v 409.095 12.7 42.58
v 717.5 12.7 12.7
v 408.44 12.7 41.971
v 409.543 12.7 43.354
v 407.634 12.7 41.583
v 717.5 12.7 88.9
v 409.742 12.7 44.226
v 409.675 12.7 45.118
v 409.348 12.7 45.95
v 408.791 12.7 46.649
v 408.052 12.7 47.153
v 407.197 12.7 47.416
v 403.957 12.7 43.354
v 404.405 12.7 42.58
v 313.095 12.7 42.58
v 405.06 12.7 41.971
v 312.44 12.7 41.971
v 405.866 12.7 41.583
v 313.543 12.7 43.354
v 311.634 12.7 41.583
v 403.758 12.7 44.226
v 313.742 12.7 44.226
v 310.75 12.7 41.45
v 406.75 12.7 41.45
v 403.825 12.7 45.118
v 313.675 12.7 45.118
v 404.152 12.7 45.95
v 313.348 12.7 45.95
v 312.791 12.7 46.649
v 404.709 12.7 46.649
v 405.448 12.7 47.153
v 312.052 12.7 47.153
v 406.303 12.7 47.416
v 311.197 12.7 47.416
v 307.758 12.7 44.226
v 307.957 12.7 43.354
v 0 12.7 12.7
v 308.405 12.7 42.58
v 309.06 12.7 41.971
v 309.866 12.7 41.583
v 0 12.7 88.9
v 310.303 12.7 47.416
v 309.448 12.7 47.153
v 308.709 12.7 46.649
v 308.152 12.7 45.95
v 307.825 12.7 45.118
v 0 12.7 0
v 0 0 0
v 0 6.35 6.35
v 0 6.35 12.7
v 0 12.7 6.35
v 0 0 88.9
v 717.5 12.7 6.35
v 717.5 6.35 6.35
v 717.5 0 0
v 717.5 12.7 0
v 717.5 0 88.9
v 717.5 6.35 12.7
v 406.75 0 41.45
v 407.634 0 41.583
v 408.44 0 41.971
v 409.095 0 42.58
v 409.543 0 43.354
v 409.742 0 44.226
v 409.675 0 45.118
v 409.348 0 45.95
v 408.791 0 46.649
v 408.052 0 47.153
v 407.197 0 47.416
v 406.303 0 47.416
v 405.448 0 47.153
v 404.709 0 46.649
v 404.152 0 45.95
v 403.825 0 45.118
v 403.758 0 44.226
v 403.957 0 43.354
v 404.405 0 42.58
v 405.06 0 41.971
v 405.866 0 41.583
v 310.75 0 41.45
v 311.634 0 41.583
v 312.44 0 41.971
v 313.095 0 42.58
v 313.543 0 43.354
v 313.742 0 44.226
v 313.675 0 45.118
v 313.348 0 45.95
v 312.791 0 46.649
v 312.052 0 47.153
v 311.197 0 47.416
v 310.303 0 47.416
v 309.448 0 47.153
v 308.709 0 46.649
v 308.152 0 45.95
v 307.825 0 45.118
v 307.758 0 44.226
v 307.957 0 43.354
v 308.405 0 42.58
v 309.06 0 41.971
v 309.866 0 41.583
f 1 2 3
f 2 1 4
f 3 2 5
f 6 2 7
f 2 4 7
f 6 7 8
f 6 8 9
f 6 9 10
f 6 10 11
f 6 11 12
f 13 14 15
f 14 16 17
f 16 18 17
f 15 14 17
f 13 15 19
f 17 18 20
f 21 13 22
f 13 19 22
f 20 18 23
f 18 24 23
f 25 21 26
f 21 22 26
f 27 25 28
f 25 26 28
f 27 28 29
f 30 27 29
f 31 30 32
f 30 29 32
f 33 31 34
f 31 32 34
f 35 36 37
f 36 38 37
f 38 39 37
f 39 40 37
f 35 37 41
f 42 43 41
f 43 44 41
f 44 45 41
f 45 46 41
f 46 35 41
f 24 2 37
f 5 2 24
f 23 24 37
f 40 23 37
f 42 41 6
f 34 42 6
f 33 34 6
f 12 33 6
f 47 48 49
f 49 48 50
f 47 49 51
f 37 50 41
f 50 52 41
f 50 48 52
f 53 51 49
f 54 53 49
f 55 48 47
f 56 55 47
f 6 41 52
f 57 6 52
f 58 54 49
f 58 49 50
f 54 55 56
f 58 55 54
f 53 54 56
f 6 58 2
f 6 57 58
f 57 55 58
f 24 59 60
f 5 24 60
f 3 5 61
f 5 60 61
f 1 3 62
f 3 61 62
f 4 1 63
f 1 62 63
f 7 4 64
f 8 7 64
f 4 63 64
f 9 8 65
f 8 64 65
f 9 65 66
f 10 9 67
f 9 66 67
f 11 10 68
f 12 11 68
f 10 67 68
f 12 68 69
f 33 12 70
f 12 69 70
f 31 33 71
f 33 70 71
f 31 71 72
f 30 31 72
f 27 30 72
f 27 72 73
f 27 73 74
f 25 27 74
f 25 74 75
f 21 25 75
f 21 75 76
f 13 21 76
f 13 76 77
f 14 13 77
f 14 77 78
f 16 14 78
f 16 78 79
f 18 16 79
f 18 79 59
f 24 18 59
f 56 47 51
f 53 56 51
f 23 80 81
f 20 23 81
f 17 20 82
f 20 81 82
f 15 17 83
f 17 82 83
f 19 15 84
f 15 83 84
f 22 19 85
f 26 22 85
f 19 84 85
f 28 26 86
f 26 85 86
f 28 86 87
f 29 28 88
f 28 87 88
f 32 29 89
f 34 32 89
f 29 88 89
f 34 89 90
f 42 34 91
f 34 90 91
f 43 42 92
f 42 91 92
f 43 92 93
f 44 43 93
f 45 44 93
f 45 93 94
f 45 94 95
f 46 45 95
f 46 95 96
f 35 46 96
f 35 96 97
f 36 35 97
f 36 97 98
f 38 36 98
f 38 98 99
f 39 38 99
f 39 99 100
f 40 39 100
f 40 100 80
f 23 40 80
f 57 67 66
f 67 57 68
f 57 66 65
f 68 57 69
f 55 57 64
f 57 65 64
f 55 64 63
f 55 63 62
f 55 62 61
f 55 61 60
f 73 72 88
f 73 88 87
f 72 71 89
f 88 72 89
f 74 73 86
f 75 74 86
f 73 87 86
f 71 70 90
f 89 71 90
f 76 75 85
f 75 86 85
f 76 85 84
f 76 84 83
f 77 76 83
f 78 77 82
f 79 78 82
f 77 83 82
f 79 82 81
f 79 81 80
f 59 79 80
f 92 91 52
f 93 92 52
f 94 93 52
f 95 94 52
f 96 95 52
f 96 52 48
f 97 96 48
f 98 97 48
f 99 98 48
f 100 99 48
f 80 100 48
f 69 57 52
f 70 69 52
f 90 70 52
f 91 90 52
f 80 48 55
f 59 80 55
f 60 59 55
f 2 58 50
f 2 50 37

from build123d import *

# Parameters (mm, degrees)
PAD_DEPTH   = 717.5
SKETCH003_R = 3
HOLE_DEPTH  = 12.701


with BuildPart() as part:
    # Sketch → Pad (new body)
    with BuildSketch(Plane.YZ):
        Polygon((0, 0), (12.7, 0), (12.7, 6.35), (6.35, 6.35), (6.35, 12.7), (12.7, 12.7), (12.7, 88.9), (0, 88.9), align=None)
    extrude(amount=PAD_DEPTH)

    # Sketch003 → Hole (cut, through all)
    with BuildSketch(Plane(origin=(0, 0, 0), x_dir=(0, 0, -1), z_dir=(0, -1, 0))):
        with Locations((-44.45, 310.75)):
            Circle(SKETCH003_R)
        with Locations((-44.45, 406.75)):
            Circle(SKETCH003_R)
    extrude(amount=-HOLE_DEPTH, mode=Mode.SUBTRACT)


solid = part.part
